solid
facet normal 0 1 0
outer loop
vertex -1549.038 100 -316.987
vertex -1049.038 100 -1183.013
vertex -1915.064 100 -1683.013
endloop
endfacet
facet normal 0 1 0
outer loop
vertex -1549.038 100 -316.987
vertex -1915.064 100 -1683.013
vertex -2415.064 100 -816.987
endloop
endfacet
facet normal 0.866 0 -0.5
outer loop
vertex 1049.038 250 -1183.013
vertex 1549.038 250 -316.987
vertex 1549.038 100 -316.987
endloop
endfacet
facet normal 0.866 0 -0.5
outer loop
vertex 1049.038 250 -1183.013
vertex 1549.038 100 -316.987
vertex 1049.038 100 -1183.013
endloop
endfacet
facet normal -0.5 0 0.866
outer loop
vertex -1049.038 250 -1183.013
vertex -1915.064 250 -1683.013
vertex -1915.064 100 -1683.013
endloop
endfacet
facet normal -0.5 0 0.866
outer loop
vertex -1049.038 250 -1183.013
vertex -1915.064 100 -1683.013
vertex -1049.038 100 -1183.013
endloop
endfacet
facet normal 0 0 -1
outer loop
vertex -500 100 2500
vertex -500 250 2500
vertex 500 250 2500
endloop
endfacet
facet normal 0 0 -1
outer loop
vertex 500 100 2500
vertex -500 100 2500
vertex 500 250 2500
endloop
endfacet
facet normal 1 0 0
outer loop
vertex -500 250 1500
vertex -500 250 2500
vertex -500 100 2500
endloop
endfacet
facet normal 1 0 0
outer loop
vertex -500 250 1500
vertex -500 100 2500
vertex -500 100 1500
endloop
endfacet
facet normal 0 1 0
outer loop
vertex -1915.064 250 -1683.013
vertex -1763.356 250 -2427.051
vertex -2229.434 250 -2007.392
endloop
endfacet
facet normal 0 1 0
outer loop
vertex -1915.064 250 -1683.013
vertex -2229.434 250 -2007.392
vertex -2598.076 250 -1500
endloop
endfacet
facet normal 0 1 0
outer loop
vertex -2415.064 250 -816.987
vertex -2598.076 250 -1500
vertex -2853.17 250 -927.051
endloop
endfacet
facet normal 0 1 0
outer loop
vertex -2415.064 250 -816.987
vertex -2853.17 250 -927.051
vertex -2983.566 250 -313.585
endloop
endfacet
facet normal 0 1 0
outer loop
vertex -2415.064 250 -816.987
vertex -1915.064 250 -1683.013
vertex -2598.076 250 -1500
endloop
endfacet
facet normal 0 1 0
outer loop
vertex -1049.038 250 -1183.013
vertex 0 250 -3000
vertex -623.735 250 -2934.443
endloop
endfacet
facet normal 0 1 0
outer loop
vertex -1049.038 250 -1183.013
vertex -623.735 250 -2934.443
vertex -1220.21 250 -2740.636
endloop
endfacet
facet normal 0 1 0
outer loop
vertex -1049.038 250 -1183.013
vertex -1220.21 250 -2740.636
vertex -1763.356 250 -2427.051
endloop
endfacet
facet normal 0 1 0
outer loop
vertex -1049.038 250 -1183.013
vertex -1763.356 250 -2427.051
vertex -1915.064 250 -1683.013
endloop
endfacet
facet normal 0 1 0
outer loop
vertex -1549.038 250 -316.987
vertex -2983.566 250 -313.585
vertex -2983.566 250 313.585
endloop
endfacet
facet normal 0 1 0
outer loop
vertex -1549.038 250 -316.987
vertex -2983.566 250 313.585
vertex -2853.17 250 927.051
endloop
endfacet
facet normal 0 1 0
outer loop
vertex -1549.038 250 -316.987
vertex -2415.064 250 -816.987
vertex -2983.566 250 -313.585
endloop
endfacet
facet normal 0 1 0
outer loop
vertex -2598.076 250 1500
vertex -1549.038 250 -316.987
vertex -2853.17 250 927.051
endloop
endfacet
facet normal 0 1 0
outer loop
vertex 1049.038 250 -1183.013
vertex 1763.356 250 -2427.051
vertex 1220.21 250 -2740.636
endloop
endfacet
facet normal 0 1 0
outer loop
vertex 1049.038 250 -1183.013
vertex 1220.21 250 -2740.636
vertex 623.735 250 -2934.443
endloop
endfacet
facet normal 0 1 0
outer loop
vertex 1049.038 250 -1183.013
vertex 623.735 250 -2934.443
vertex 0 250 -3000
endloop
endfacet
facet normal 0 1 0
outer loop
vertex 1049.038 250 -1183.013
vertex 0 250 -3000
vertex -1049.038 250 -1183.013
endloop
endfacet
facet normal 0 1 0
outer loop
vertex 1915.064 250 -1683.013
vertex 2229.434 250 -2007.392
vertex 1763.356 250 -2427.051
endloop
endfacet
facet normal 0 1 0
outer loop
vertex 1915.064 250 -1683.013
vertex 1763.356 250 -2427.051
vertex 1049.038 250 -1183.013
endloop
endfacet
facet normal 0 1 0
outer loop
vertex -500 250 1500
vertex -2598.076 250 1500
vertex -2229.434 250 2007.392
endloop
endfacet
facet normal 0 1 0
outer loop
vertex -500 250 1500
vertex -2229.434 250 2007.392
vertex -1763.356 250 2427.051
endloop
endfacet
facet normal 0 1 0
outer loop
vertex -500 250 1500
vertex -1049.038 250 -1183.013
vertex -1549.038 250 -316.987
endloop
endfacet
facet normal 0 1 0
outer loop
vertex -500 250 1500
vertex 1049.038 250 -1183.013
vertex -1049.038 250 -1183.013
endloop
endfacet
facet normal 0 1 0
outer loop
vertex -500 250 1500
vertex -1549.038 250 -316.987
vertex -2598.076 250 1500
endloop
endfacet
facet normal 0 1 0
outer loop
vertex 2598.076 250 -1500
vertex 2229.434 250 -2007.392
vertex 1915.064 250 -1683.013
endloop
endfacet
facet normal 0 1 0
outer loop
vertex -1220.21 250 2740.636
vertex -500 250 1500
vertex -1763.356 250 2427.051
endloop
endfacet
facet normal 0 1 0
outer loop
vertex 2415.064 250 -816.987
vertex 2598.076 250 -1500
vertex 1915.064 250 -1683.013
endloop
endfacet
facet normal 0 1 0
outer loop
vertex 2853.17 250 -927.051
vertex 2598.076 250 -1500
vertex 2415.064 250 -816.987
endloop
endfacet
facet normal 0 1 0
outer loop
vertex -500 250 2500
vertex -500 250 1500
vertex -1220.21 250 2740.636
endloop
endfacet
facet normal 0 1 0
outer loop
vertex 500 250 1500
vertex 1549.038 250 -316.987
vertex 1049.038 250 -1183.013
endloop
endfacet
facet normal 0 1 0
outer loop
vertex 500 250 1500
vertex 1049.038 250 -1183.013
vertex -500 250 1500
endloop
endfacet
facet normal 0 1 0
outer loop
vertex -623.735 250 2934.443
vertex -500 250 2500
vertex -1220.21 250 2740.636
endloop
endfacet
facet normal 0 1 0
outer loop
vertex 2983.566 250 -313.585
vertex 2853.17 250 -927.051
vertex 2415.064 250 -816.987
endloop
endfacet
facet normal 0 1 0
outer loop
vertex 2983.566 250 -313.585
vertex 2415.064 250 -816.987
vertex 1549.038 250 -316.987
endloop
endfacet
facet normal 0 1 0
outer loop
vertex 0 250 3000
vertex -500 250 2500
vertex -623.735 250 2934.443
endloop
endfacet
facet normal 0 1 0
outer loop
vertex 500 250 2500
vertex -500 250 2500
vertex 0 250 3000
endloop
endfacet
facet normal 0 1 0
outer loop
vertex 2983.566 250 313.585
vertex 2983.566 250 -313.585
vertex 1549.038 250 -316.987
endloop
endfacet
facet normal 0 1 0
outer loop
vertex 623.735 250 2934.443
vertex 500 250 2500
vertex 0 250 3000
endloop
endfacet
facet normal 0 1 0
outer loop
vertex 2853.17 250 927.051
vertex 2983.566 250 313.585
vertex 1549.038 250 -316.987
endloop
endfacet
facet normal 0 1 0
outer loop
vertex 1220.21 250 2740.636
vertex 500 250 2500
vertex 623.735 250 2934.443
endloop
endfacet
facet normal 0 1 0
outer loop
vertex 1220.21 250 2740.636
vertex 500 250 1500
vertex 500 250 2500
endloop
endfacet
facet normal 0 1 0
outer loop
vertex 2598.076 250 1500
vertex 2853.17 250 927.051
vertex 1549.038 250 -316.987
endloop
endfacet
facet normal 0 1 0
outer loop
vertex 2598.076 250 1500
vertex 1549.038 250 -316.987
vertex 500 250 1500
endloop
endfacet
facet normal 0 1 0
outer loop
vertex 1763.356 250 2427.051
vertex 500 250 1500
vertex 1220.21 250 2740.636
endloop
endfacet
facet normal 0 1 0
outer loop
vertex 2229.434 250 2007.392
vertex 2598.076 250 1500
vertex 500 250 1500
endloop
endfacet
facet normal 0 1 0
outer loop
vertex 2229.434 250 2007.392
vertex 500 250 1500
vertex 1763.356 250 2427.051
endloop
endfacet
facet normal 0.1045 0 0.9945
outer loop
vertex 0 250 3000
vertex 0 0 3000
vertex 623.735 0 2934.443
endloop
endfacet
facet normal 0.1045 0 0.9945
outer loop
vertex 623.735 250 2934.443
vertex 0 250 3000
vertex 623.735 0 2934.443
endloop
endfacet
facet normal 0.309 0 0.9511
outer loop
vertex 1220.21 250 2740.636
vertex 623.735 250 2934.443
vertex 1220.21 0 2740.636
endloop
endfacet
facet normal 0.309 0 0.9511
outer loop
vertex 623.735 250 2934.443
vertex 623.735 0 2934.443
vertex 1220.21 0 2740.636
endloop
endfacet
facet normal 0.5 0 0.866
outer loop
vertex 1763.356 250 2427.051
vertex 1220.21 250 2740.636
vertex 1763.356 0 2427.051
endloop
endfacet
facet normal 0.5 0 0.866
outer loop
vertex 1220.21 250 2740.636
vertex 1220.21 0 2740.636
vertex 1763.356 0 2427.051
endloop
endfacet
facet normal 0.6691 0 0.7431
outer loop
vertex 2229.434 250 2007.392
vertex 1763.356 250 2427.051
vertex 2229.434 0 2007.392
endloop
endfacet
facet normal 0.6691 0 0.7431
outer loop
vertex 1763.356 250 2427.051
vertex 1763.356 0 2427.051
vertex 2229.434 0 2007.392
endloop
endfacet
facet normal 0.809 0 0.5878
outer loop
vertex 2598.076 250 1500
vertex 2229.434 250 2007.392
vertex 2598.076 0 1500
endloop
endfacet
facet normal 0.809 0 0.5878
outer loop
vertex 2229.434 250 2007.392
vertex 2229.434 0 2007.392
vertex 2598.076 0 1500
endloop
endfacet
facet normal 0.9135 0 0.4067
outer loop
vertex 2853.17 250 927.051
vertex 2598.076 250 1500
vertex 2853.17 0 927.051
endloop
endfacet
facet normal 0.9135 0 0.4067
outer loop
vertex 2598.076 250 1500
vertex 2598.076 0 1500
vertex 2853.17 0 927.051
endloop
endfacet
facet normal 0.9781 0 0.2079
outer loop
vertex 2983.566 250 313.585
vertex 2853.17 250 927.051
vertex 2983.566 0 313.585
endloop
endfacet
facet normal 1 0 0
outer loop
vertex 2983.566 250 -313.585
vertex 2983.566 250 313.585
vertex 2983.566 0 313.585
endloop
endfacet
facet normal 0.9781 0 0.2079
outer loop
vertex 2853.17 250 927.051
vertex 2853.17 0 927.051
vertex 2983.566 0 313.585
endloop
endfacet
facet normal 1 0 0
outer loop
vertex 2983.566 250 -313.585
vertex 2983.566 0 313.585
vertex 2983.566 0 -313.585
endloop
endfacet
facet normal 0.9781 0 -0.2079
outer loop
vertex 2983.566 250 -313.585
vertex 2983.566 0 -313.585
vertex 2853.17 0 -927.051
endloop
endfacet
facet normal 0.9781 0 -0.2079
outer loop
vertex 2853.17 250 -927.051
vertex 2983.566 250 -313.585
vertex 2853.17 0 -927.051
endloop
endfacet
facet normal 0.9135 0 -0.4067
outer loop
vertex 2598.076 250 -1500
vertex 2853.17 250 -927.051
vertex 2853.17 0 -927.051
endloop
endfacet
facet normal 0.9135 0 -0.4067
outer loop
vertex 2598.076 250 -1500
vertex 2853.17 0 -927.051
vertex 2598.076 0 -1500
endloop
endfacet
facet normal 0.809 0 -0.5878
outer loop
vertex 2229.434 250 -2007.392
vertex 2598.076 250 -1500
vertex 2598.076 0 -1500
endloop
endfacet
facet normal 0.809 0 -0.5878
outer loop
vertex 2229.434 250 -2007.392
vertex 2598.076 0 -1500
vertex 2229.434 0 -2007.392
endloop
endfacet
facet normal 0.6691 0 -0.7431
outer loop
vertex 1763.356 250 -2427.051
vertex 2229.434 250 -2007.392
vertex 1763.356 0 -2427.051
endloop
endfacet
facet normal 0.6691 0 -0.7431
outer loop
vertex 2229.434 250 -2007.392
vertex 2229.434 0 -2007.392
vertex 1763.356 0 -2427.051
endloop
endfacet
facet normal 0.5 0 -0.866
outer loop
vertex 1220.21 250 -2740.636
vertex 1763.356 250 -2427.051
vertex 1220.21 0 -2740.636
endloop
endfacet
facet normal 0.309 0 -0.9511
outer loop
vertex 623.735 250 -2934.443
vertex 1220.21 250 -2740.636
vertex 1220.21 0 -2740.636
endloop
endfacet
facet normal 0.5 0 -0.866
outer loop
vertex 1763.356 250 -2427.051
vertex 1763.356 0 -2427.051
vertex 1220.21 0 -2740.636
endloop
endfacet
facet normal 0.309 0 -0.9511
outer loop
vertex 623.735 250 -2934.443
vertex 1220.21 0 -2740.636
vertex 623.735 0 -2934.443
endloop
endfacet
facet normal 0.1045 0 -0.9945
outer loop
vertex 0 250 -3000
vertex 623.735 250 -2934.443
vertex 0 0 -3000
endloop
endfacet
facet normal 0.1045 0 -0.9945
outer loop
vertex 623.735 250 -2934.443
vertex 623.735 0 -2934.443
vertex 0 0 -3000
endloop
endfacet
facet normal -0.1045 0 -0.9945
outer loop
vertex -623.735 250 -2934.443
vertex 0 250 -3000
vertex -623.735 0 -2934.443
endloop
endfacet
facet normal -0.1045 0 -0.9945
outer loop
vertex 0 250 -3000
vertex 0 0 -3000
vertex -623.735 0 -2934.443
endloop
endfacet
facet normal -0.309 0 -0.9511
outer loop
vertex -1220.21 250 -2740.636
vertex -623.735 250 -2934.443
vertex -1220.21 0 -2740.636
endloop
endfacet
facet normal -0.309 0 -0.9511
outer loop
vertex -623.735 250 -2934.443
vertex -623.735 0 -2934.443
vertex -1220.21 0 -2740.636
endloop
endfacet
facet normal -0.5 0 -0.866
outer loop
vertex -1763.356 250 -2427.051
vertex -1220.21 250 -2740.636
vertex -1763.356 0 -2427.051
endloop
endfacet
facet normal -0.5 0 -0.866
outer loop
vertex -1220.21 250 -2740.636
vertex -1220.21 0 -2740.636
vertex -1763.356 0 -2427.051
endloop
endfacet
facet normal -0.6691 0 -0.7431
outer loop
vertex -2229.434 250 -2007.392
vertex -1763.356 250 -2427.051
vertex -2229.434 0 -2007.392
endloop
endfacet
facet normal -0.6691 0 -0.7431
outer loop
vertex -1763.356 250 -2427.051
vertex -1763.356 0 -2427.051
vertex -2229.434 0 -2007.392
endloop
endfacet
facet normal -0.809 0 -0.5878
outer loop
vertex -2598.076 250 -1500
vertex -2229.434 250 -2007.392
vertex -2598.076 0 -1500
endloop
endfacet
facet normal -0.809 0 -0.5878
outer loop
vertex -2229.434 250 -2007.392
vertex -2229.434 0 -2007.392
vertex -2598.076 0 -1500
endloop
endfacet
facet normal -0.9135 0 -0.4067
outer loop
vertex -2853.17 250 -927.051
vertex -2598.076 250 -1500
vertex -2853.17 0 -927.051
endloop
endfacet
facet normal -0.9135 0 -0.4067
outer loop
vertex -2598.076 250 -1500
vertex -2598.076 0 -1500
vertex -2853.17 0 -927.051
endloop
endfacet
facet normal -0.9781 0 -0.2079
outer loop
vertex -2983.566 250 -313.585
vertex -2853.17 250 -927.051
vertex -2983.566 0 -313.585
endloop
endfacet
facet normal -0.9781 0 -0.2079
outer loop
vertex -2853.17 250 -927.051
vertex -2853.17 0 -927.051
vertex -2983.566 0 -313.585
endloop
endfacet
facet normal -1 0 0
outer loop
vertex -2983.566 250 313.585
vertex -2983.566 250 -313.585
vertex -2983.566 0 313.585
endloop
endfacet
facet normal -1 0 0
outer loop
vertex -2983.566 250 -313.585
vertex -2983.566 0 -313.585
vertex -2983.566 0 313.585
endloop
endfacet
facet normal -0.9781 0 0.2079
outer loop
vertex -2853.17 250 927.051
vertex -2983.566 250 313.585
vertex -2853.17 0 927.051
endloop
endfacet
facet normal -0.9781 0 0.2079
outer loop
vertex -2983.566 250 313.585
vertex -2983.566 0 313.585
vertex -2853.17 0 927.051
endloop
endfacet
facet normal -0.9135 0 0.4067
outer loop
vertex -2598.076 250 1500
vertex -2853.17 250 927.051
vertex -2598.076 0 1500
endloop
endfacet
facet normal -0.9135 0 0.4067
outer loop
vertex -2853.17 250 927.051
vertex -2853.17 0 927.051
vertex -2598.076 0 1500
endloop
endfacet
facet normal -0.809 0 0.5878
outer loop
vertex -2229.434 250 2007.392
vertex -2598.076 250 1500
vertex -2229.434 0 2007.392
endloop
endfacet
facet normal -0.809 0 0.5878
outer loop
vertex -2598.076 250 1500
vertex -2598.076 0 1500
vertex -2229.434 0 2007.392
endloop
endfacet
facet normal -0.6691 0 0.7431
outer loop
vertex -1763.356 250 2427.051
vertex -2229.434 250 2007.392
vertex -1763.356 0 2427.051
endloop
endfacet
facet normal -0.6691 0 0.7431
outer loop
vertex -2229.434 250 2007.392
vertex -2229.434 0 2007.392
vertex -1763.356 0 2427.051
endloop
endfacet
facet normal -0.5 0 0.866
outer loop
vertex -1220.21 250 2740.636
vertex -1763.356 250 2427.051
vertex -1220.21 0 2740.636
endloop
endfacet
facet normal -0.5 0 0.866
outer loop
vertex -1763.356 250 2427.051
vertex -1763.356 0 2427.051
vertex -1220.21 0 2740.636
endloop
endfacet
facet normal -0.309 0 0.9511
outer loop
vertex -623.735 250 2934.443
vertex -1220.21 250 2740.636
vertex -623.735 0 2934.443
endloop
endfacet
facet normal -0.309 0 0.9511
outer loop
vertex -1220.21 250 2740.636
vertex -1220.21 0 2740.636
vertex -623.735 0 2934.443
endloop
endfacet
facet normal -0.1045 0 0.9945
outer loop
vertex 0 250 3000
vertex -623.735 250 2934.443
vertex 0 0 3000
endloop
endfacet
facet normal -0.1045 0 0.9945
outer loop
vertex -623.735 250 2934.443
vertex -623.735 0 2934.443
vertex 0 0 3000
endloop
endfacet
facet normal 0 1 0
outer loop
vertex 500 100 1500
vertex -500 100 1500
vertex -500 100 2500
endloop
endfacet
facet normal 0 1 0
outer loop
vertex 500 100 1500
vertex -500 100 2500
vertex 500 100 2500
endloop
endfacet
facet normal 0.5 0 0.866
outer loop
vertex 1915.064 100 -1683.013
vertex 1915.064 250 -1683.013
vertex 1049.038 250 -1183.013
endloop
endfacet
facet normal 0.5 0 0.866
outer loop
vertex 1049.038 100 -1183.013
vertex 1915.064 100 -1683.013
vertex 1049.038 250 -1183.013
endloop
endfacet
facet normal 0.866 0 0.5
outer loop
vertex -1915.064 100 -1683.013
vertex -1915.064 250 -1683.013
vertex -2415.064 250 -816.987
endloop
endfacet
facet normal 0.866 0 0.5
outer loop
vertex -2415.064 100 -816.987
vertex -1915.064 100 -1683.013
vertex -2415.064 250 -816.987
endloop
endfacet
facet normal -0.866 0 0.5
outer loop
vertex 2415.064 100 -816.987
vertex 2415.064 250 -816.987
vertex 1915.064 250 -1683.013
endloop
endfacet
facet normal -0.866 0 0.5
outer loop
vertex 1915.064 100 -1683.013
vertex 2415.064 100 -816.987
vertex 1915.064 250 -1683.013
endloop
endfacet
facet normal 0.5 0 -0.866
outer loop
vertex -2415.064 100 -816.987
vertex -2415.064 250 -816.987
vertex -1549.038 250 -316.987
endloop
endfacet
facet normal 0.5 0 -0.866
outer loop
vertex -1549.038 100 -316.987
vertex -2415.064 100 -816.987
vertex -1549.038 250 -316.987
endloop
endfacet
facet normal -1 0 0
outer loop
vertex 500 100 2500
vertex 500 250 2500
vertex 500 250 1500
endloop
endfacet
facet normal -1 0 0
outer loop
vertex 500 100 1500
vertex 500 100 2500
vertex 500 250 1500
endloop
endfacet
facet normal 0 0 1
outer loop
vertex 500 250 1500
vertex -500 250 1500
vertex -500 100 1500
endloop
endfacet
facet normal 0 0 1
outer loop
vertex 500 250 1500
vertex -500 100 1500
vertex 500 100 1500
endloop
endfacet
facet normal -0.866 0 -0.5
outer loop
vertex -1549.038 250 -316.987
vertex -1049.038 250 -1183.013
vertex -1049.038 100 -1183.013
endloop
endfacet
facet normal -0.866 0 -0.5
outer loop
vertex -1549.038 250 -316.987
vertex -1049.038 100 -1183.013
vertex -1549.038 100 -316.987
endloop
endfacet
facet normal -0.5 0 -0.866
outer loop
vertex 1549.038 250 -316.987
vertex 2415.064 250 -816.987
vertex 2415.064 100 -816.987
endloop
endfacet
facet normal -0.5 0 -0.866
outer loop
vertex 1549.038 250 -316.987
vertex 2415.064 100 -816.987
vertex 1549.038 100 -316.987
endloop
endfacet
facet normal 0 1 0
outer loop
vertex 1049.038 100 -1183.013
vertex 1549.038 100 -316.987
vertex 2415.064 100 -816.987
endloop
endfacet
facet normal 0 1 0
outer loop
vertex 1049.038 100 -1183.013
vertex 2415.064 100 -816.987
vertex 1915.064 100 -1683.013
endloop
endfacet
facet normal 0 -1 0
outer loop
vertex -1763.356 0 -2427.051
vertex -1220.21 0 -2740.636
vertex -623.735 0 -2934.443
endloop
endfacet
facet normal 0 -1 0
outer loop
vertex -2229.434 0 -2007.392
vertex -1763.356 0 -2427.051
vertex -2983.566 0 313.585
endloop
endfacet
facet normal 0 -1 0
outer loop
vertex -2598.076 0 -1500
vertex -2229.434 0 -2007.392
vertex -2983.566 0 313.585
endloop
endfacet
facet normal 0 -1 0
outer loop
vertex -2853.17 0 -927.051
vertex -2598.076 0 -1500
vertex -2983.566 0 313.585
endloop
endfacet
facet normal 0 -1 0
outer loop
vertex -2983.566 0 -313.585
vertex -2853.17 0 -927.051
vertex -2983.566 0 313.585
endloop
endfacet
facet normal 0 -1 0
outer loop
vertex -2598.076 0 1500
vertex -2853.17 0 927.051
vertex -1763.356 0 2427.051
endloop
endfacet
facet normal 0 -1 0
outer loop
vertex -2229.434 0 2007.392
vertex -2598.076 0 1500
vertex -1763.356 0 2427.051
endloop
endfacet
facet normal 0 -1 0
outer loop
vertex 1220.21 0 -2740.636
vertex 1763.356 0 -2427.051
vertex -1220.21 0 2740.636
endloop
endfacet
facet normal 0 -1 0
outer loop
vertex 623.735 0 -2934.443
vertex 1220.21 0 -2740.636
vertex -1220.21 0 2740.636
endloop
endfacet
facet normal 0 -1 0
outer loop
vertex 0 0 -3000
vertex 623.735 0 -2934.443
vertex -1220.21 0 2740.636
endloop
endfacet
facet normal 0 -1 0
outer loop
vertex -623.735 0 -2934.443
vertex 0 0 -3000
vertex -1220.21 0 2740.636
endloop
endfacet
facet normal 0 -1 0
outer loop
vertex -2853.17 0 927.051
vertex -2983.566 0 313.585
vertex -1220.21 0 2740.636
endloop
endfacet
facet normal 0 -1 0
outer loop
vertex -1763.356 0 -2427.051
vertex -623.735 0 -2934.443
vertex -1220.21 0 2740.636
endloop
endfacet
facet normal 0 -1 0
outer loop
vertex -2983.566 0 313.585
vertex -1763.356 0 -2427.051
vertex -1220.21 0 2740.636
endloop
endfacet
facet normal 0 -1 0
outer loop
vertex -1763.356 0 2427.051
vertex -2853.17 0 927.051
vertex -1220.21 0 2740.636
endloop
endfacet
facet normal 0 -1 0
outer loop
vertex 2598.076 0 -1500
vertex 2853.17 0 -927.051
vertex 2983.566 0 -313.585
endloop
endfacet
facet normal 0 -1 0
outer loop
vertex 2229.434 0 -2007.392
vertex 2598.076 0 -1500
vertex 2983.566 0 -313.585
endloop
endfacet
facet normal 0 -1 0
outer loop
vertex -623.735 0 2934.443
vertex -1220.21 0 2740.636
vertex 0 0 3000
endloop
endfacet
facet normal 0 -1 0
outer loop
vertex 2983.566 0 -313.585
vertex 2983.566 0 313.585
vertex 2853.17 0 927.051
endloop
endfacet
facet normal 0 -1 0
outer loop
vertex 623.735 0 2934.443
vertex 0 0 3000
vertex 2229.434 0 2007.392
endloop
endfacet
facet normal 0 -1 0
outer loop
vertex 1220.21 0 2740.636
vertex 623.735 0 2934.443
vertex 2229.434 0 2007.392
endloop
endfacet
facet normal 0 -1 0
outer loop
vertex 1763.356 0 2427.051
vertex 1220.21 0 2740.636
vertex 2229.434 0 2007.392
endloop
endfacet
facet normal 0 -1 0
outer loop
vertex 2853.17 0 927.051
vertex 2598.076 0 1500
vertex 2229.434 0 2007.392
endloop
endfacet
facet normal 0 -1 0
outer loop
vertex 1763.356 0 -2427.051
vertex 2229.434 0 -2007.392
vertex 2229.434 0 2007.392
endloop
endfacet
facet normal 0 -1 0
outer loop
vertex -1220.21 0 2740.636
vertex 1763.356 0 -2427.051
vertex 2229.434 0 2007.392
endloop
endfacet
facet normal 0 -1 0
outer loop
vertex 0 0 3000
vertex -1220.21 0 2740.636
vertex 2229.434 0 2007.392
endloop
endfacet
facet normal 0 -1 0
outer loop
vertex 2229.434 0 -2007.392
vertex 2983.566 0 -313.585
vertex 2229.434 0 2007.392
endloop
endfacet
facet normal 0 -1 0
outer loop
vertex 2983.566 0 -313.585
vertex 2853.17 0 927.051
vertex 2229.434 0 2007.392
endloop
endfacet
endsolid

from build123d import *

# Parameters (mm, degrees)
SKETCH1_R           = 3000
BOSS_EXTRUDE1_DEPTH = 250
SKETCH2_W           = 1000
SKETCH2_H           = 1000
CUT_EXTRUDE1_DEPTH  = 150
CIRPATTERN1_COUNT   = 3


with BuildPart() as part:
    # Sketch1 → Boss-Extrude1 (new body)
    with BuildSketch(Plane(origin=(0, 0, 0), x_dir=(1, 0, 0), z_dir=(0, 1, 0))):
        with Locations(Location((0, 0, 0), (0, 0, 270))):
            Circle(SKETCH1_R)
    extrude(amount=BOSS_EXTRUDE1_DEPTH)

    # Sketch2 → Cut-Extrude1 (cut)
    with BuildSketch(Plane(origin=(0, 250, 0), x_dir=(1, 0, 0), z_dir=(0, 1, 0))):
        with Locations((0, -2000)):
            Rectangle(SKETCH2_W, SKETCH2_H)
    cut_extrude1 = extrude(amount=-CUT_EXTRUDE1_DEPTH, mode=Mode.SUBTRACT)

    # CirPattern1: Cut-Extrude1 ×3 about axis
    cirpattern1_axis = Axis((0, 0, 0), (0, 1, 0))
    for i in range(1, CIRPATTERN1_COUNT):
        add(cut_extrude1.rotate(cirpattern1_axis, i * 360 / CIRPATTERN1_COUNT), mode=Mode.SUBTRACT)


solid = part.part
